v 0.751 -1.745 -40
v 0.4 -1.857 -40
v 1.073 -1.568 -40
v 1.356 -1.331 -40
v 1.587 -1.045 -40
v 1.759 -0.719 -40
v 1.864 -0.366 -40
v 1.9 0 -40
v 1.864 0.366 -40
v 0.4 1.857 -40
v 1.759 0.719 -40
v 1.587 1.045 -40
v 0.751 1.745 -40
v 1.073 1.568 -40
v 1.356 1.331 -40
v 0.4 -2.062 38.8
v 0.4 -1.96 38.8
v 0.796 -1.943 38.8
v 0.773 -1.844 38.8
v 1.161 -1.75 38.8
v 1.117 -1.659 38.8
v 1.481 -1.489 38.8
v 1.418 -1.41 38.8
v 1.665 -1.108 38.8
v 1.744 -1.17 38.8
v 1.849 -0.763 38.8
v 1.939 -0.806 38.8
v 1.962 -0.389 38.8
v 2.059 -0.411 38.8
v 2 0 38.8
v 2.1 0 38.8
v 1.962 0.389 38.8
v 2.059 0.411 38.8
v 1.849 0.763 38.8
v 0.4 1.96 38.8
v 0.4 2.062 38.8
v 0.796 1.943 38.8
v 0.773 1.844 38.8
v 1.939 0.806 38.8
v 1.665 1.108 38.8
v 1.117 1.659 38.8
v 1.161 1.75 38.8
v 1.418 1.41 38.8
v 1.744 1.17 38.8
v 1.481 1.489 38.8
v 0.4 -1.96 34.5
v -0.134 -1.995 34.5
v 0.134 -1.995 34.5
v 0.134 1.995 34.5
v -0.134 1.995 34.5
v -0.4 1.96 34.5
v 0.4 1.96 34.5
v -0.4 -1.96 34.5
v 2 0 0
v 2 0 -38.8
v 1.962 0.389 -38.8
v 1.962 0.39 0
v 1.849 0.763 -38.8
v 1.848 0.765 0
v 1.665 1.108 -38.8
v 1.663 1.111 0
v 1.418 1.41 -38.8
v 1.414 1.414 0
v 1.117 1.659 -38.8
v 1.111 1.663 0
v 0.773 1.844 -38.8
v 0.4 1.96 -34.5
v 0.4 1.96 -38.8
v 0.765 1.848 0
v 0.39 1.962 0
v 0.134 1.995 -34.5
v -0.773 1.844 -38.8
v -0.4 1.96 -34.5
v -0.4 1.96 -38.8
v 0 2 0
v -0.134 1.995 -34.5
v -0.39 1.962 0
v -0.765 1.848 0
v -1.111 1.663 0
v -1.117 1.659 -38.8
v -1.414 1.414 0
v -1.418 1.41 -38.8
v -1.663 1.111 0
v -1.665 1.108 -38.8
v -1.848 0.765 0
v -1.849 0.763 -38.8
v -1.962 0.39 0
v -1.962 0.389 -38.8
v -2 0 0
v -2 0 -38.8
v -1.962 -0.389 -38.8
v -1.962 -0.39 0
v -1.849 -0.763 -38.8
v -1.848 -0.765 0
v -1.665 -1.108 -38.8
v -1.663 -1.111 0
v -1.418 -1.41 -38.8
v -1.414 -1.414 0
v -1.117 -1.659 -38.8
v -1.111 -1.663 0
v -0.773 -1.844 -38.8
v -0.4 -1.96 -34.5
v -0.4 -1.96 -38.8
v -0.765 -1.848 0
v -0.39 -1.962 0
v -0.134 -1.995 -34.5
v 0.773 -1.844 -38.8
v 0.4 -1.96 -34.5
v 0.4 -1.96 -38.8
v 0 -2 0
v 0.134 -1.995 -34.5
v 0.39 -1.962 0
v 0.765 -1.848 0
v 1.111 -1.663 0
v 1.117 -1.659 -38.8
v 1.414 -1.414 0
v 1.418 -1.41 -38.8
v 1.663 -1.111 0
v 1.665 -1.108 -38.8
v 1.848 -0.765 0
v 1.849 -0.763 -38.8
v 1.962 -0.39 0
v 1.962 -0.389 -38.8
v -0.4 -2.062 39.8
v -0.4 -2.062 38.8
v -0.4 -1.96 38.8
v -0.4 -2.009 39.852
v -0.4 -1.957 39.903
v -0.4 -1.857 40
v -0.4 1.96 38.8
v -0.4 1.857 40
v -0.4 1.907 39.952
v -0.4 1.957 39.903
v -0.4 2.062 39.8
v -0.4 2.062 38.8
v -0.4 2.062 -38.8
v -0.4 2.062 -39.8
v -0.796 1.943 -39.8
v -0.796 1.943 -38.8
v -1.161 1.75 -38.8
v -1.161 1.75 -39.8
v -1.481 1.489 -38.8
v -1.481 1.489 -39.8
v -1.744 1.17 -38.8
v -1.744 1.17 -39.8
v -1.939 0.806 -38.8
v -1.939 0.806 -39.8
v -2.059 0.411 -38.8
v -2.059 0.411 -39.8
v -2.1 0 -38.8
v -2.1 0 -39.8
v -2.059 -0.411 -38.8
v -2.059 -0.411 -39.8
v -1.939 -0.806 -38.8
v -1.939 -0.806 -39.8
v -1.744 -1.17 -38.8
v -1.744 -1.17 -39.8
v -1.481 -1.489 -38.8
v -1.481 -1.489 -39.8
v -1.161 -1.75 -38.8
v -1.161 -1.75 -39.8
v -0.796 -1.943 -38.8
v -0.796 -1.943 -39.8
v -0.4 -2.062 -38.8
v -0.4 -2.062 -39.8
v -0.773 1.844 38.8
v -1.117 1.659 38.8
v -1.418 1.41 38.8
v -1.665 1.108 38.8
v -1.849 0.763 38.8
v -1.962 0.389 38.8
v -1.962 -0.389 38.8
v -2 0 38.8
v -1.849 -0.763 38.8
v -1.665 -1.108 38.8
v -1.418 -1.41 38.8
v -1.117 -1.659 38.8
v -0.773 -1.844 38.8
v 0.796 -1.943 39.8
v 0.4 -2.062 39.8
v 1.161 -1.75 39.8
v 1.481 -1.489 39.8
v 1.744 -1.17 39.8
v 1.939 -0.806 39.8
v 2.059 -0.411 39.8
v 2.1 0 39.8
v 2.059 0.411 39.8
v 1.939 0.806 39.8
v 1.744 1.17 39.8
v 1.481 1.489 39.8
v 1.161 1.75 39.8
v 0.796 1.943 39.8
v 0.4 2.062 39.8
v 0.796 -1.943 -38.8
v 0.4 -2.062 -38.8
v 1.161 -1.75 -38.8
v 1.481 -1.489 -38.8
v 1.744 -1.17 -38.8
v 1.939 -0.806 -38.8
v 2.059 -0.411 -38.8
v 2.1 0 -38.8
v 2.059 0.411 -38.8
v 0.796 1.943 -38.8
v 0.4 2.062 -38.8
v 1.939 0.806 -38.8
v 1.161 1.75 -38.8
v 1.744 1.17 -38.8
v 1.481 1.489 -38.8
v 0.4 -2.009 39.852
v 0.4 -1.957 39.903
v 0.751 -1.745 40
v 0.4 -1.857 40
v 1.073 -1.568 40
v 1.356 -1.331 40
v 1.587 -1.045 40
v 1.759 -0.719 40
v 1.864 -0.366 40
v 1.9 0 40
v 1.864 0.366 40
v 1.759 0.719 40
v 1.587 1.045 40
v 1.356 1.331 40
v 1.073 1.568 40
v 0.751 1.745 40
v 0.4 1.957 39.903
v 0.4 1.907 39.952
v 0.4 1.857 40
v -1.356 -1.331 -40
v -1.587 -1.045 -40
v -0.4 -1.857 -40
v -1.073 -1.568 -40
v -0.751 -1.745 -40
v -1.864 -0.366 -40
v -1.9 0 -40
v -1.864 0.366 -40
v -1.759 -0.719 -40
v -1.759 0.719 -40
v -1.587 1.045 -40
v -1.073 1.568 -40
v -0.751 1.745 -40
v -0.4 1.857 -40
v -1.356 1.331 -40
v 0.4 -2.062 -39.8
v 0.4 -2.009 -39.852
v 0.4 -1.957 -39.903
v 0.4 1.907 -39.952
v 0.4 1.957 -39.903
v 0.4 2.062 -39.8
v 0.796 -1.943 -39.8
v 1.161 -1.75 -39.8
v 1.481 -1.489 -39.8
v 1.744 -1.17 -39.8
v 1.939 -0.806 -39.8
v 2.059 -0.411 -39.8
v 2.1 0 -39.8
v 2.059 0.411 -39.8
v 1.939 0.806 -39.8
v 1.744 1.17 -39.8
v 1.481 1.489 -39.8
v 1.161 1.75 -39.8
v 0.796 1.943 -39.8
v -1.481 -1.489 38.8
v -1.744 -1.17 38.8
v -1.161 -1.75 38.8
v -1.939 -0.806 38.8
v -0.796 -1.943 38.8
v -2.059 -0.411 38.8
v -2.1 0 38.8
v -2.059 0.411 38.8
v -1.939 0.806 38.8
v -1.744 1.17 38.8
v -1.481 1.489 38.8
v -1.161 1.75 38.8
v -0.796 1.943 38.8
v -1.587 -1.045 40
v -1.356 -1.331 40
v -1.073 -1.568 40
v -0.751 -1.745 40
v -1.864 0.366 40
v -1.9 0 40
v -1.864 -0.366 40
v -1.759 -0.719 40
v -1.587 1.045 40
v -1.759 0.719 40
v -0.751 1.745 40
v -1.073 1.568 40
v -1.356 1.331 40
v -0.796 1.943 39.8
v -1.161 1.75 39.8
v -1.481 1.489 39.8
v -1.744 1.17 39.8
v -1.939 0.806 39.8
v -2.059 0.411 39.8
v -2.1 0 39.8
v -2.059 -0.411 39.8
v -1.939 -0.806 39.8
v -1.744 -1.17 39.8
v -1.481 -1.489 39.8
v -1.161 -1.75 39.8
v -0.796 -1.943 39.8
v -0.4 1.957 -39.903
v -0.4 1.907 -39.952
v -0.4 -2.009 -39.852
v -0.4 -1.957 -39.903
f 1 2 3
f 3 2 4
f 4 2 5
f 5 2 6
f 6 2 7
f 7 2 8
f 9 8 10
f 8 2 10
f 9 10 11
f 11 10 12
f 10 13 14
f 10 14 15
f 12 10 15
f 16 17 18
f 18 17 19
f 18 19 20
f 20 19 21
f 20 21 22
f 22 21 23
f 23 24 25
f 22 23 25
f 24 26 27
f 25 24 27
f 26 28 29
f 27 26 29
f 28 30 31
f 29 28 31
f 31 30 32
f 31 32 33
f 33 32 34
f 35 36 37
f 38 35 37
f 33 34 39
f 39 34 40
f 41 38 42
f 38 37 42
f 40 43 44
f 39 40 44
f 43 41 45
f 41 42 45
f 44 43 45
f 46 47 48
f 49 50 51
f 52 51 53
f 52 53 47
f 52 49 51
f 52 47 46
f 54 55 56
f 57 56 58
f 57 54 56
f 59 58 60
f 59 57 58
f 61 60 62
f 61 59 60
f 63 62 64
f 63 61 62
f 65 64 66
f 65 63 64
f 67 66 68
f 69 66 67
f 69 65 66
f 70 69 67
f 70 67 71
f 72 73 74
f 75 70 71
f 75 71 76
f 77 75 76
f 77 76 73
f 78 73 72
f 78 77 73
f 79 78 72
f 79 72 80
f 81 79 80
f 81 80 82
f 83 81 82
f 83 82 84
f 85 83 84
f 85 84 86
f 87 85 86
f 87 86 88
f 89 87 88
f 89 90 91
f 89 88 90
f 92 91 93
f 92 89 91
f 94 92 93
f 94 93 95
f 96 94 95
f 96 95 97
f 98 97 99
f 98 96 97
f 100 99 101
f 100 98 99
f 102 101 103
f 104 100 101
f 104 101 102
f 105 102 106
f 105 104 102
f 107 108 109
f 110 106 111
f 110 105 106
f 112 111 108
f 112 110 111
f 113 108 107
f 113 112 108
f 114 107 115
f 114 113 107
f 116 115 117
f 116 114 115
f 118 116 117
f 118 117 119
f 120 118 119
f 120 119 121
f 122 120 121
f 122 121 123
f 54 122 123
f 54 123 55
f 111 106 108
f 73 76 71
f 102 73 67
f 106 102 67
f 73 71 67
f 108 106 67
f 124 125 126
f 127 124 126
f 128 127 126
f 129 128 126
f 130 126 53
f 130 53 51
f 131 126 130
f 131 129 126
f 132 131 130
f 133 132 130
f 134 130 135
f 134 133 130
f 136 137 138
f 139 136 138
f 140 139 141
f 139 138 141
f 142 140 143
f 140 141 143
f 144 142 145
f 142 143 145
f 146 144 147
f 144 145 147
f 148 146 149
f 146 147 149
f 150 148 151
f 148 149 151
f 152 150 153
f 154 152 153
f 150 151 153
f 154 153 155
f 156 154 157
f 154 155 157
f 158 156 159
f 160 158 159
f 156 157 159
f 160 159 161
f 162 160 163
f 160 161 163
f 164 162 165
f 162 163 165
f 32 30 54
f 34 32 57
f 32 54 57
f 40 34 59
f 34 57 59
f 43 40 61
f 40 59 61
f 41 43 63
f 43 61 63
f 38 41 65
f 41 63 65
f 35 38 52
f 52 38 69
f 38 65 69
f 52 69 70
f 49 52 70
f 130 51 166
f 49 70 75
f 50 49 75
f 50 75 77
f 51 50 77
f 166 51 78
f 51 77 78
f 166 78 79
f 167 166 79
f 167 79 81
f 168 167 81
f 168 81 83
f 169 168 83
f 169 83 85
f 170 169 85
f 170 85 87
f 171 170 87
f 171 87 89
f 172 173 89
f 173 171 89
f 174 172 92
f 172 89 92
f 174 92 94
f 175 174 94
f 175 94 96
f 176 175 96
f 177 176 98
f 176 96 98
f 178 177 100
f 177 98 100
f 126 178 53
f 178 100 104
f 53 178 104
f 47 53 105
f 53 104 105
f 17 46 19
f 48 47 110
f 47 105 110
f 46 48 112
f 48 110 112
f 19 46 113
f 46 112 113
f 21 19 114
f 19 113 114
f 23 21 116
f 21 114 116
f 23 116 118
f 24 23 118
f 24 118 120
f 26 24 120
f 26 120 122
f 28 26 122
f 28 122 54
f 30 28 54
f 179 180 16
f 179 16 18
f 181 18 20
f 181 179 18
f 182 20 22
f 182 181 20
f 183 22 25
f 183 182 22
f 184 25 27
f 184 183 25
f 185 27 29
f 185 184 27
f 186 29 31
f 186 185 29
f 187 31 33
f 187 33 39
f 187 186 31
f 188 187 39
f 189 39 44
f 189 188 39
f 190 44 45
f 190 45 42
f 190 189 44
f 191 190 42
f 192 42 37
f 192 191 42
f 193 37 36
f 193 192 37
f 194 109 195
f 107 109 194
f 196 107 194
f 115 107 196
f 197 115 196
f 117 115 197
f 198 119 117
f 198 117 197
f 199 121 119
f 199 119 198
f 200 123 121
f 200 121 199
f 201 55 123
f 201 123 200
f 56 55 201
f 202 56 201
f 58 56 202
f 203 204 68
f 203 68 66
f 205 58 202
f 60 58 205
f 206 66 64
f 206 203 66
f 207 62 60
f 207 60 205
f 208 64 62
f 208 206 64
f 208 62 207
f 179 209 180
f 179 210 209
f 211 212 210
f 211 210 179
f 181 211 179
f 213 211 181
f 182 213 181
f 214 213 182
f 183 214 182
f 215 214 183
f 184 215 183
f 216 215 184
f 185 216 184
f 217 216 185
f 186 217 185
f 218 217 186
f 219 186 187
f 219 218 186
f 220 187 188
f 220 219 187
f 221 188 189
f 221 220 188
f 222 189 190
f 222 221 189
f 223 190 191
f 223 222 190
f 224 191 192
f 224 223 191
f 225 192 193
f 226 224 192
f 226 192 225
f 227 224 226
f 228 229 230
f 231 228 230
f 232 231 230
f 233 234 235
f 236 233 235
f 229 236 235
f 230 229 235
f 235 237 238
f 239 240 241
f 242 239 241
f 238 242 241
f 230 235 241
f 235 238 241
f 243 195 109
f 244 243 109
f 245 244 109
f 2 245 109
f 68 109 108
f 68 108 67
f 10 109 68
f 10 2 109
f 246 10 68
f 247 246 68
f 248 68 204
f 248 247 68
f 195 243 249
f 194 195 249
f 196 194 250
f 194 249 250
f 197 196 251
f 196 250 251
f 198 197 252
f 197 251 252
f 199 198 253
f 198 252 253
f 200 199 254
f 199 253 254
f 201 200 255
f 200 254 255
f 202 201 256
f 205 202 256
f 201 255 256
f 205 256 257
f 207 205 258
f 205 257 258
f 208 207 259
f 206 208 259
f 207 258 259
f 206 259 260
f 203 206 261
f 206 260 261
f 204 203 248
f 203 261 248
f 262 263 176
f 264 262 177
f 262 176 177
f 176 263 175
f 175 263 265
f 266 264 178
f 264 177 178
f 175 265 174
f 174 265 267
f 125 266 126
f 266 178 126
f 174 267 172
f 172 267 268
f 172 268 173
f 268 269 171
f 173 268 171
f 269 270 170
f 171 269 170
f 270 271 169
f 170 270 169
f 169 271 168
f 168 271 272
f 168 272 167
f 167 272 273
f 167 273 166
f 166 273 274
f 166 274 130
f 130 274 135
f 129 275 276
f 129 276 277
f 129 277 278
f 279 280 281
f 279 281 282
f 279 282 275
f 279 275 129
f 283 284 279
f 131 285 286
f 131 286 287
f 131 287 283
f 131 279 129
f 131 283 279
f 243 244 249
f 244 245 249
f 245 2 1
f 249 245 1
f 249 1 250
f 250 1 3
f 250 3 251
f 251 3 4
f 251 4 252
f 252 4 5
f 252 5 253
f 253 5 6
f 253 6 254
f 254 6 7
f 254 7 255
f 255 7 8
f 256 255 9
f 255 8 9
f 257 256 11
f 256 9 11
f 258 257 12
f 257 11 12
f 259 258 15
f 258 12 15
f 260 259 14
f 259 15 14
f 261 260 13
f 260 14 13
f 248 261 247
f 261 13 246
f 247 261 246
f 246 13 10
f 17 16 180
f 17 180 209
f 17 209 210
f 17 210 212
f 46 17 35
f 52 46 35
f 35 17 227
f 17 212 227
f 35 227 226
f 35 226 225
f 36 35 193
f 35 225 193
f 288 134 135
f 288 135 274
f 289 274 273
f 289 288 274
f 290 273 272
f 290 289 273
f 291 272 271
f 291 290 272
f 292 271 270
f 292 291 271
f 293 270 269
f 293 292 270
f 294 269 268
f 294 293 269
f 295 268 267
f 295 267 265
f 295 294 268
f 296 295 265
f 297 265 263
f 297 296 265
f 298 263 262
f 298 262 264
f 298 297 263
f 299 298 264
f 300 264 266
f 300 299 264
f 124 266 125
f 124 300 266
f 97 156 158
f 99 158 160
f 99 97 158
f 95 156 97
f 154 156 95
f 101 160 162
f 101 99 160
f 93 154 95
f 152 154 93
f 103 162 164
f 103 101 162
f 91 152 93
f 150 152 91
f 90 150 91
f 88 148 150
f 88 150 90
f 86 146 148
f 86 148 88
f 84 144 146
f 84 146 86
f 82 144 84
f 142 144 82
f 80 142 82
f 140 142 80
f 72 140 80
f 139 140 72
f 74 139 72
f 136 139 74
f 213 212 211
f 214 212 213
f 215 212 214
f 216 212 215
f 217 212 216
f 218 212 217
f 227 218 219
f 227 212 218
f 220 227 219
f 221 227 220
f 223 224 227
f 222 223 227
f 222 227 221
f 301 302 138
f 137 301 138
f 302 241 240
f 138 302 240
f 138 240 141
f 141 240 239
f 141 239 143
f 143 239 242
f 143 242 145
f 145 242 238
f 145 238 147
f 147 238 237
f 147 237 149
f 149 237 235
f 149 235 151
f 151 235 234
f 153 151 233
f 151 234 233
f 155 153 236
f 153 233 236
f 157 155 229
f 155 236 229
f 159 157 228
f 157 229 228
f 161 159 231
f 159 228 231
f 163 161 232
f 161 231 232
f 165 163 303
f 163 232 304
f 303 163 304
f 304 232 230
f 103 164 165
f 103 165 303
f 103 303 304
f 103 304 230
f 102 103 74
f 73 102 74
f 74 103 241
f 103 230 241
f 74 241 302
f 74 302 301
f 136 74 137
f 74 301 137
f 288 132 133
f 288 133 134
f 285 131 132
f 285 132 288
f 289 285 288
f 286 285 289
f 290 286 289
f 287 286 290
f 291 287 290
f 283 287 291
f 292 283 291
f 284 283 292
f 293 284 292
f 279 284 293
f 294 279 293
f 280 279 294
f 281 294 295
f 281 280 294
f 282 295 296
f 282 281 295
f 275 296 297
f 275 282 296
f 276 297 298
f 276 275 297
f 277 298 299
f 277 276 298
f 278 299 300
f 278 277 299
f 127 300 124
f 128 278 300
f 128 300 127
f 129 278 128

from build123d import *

# Parameters (mm, degrees)
SKETCH_1_R          = 2
EXTRUDE_1_DEPTH     = 40
SKETCH_2_R          = 2.1
EXTRUDE_2_DEPTH     = 1.2
CHAMFER_1_SIZE      = 0.2
SKETCH_3_W          = 0.8
SKETCH_3_H          = 4.5
CUT_EXTRUDE_1_DEPTH = 5.5


# Read off the part's stored shape, not the designer's step: 镜向1
with BuildPart() as part:
    # 草图1 → 凸台-拉伸1 (new body)
    with BuildSketch(Plane.XY):
        Circle(SKETCH_1_R)
    extrude(amount=EXTRUDE_1_DEPTH)

    # 草图2 → 凸台-拉伸2 (add)
    with BuildSketch(Plane.XY.offset(40)):
        Circle(SKETCH_2_R)
    extrude(amount=-EXTRUDE_2_DEPTH)

    # 倒角1
    chamfer_1_edges = [part.edges().sort_by_distance(p)[0] for p in [
        (-2.1, 0, 40),
    ]]
    chamfer(chamfer_1_edges, length=CHAMFER_1_SIZE)

    # 草图3 → 切除-拉伸1 (cut)
    with BuildSketch(Plane.XY.offset(40)):
        Rectangle(SKETCH_3_W, SKETCH_3_H)
    extrude(amount=-CUT_EXTRUDE_1_DEPTH, mode=Mode.SUBTRACT)

    # 镜向1: part across plane


with BuildPart() as part_1:
    add(part.part)
    add(part.part.mirror(Plane.XY))


solid = part_1.part
